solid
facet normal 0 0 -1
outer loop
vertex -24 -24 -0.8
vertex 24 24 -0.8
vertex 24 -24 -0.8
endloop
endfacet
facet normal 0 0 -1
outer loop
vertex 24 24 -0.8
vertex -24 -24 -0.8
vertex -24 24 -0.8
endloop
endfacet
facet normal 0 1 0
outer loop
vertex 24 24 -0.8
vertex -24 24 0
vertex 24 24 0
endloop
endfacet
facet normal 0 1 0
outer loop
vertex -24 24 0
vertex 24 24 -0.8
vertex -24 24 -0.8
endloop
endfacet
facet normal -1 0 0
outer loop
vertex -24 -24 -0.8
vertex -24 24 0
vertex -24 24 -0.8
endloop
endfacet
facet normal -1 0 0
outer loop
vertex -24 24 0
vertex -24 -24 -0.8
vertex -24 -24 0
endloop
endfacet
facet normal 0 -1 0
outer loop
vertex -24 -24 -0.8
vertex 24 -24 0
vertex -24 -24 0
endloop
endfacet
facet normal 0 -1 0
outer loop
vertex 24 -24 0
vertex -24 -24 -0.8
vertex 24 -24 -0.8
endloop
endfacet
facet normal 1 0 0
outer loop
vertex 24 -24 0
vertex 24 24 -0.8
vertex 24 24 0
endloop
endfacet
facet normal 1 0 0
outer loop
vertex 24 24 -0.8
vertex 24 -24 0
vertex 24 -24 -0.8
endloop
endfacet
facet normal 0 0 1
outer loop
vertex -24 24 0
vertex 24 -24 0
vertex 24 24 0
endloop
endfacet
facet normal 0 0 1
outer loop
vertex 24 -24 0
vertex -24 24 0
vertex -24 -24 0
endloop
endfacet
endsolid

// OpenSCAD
// file: ../p/box5.scad
use <../lib.scad>
function ldraw_lib__box5() = [
// 0 Box with 5 Faces and All Edges
// 0 Name: box5.dat
// 0 Author: James Jessiman
// 0 !LDRAW_ORG Primitive UPDATE 2012-01
// 0 !LICENSE Licensed under CC BY 4.0 : see CAreadme.txt
// 
// 0 BFC CERTIFY CCW
  [0,"BFC","CERTIFY"],
  [0,"BFC","CCW"],
// 
// 0 !HISTORY 2002-04-03 [sbliss] Modified for BFC compliance
// 0 !HISTORY 2002-04-25 [PTadmin] Official Update 2002-02
// 0 !HISTORY 2007-06-24 [PTadmin] Header formatted for Contributor Agreement
// 0 !HISTORY 2008-07-01 [PTadmin] Official Update 2008-01
// 0 !HISTORY 2012-02-16 [Philo] Changed to CCW
// 0 !HISTORY 2012-03-30 [PTadmin] Official Update 2012-01
// 
// 
// 2 24 1 1 1 -1 1 1
  [2,24,1,1,1,-1,1,1],
// 2 24 -1 1 1 -1 1 -1
  [2,24,-1,1,1,-1,1,-1],
// 2 24 -1 1 -1 1 1 -1
  [2,24,-1,1,-1,1,1,-1],
// 2 24 1 1 -1 1 1 1
  [2,24,1,1,-1,1,1,1],
// 2 24 1 0 1 -1 0 1
  [2,24,1,0,1,-1,0,1],
// 2 24 -1 0 1 -1 0 -1
  [2,24,-1,0,1,-1,0,-1],
// 2 24 -1 0 -1 1 0 -1
  [2,24,-1,0,-1,1,0,-1],
// 2 24 1 0 -1 1 0 1
  [2,24,1,0,-1,1,0,1],
// 2 24 1 0 1 1 1 1
  [2,24,1,0,1,1,1,1],
// 2 24 -1 0 1 -1 1 1
  [2,24,-1,0,1,-1,1,1],
// 2 24 1 0 -1 1 1 -1
  [2,24,1,0,-1,1,1,-1],
// 2 24 -1 0 -1 -1 1 -1
  [2,24,-1,0,-1,-1,1,-1],
// 4 16 -1 1 1 1 1 1 1 1 -1 -1 1 -1
  [4,16,-1,1,1,1,1,1,1,1,-1,-1,1,-1],
// 4 16 -1 1 1 -1 0 1 1 0 1 1 1 1
  [4,16,-1,1,1,-1,0,1,1,0,1,1,1,1],
// 4 16 -1 1 -1 -1 0 -1 -1 0 1 -1 1 1
  [4,16,-1,1,-1,-1,0,-1,-1,0,1,-1,1,1],
// 4 16 1 1 -1 1 0 -1 -1 0 -1 -1 1 -1
  [4,16,1,1,-1,1,0,-1,-1,0,-1,-1,1,-1],
// 4 16 1 1 1 1 0 1 1 0 -1 1 1 -1
  [4,16,1,1,1,1,0,1,1,0,-1,1,1,-1],
];
module ldraw_lib__box5(step=0, col=false, unit=2/5, alt=false, line=0.2, solid=!$preview)
    makepoly(ldraw_lib__box5(), step=step, col=col, unit=unit, alt=alt, line=line, solid=solid);
ldraw_lib__box5(line=0.2);
// main file
use <../lib.scad>
use <../p/box5.scad>
function ldraw_lib__191766() = [
// 0 Cardboard  6 x  6 Thick with Sharp Corners with White Top
// 0 Name: 191766.dat
// 0 Author: Steffen [Steffen]
// 0 !LDRAW_ORG Part UPDATE 2020-02
// 0 !LICENSE Licensed under CC BY 4.0 : see CAreadme.txt
// 
// 0 !HELP For Plate 8 x 8 with Grille
// 
// 0 BFC CERTIFY CCW
  [0,"BFC","CERTIFY"],
  [0,"BFC","CCW"],
// 
// 0 !CATEGORY Sheet Cardboard
// 0 !KEYWORDS Scala, set 4336
// 
// 0 !HISTORY 2019-09-09 [PTadmin] Official Update 2019-02
// 0 !HISTORY 2020-07-06 [Steffen] adjusted title and !HELP
// 0 !HISTORY 2020-07-08 [PTadmin] Renamed from u9253p01
// 0 !HISTORY 2020-09-05 [PTadmin] Official Update 2020-02
// 
// 
// 1 16 0 0 0 60 0 0 0 2 0 0 0 60 box5.dat
  [1,16,0,0,0,60,0,0,0,2,0,0,0,60, ldraw_lib__box5()],
// 4 15 -60 0 -60 60 0 -60 60 0 60 -60 0 60
  [4,15,-60,0,-60,60,0,-60,60,0,60,-60,0,60],
];
module ldraw_lib__191766(step=0, col=false, unit=2/5, alt=false, line=0.2, solid=!$preview)
    makepoly(ldraw_lib__191766(), step=step, col=col, unit=unit, alt=alt, line=line, solid=solid);
ldraw_lib__191766(line=0.2);
